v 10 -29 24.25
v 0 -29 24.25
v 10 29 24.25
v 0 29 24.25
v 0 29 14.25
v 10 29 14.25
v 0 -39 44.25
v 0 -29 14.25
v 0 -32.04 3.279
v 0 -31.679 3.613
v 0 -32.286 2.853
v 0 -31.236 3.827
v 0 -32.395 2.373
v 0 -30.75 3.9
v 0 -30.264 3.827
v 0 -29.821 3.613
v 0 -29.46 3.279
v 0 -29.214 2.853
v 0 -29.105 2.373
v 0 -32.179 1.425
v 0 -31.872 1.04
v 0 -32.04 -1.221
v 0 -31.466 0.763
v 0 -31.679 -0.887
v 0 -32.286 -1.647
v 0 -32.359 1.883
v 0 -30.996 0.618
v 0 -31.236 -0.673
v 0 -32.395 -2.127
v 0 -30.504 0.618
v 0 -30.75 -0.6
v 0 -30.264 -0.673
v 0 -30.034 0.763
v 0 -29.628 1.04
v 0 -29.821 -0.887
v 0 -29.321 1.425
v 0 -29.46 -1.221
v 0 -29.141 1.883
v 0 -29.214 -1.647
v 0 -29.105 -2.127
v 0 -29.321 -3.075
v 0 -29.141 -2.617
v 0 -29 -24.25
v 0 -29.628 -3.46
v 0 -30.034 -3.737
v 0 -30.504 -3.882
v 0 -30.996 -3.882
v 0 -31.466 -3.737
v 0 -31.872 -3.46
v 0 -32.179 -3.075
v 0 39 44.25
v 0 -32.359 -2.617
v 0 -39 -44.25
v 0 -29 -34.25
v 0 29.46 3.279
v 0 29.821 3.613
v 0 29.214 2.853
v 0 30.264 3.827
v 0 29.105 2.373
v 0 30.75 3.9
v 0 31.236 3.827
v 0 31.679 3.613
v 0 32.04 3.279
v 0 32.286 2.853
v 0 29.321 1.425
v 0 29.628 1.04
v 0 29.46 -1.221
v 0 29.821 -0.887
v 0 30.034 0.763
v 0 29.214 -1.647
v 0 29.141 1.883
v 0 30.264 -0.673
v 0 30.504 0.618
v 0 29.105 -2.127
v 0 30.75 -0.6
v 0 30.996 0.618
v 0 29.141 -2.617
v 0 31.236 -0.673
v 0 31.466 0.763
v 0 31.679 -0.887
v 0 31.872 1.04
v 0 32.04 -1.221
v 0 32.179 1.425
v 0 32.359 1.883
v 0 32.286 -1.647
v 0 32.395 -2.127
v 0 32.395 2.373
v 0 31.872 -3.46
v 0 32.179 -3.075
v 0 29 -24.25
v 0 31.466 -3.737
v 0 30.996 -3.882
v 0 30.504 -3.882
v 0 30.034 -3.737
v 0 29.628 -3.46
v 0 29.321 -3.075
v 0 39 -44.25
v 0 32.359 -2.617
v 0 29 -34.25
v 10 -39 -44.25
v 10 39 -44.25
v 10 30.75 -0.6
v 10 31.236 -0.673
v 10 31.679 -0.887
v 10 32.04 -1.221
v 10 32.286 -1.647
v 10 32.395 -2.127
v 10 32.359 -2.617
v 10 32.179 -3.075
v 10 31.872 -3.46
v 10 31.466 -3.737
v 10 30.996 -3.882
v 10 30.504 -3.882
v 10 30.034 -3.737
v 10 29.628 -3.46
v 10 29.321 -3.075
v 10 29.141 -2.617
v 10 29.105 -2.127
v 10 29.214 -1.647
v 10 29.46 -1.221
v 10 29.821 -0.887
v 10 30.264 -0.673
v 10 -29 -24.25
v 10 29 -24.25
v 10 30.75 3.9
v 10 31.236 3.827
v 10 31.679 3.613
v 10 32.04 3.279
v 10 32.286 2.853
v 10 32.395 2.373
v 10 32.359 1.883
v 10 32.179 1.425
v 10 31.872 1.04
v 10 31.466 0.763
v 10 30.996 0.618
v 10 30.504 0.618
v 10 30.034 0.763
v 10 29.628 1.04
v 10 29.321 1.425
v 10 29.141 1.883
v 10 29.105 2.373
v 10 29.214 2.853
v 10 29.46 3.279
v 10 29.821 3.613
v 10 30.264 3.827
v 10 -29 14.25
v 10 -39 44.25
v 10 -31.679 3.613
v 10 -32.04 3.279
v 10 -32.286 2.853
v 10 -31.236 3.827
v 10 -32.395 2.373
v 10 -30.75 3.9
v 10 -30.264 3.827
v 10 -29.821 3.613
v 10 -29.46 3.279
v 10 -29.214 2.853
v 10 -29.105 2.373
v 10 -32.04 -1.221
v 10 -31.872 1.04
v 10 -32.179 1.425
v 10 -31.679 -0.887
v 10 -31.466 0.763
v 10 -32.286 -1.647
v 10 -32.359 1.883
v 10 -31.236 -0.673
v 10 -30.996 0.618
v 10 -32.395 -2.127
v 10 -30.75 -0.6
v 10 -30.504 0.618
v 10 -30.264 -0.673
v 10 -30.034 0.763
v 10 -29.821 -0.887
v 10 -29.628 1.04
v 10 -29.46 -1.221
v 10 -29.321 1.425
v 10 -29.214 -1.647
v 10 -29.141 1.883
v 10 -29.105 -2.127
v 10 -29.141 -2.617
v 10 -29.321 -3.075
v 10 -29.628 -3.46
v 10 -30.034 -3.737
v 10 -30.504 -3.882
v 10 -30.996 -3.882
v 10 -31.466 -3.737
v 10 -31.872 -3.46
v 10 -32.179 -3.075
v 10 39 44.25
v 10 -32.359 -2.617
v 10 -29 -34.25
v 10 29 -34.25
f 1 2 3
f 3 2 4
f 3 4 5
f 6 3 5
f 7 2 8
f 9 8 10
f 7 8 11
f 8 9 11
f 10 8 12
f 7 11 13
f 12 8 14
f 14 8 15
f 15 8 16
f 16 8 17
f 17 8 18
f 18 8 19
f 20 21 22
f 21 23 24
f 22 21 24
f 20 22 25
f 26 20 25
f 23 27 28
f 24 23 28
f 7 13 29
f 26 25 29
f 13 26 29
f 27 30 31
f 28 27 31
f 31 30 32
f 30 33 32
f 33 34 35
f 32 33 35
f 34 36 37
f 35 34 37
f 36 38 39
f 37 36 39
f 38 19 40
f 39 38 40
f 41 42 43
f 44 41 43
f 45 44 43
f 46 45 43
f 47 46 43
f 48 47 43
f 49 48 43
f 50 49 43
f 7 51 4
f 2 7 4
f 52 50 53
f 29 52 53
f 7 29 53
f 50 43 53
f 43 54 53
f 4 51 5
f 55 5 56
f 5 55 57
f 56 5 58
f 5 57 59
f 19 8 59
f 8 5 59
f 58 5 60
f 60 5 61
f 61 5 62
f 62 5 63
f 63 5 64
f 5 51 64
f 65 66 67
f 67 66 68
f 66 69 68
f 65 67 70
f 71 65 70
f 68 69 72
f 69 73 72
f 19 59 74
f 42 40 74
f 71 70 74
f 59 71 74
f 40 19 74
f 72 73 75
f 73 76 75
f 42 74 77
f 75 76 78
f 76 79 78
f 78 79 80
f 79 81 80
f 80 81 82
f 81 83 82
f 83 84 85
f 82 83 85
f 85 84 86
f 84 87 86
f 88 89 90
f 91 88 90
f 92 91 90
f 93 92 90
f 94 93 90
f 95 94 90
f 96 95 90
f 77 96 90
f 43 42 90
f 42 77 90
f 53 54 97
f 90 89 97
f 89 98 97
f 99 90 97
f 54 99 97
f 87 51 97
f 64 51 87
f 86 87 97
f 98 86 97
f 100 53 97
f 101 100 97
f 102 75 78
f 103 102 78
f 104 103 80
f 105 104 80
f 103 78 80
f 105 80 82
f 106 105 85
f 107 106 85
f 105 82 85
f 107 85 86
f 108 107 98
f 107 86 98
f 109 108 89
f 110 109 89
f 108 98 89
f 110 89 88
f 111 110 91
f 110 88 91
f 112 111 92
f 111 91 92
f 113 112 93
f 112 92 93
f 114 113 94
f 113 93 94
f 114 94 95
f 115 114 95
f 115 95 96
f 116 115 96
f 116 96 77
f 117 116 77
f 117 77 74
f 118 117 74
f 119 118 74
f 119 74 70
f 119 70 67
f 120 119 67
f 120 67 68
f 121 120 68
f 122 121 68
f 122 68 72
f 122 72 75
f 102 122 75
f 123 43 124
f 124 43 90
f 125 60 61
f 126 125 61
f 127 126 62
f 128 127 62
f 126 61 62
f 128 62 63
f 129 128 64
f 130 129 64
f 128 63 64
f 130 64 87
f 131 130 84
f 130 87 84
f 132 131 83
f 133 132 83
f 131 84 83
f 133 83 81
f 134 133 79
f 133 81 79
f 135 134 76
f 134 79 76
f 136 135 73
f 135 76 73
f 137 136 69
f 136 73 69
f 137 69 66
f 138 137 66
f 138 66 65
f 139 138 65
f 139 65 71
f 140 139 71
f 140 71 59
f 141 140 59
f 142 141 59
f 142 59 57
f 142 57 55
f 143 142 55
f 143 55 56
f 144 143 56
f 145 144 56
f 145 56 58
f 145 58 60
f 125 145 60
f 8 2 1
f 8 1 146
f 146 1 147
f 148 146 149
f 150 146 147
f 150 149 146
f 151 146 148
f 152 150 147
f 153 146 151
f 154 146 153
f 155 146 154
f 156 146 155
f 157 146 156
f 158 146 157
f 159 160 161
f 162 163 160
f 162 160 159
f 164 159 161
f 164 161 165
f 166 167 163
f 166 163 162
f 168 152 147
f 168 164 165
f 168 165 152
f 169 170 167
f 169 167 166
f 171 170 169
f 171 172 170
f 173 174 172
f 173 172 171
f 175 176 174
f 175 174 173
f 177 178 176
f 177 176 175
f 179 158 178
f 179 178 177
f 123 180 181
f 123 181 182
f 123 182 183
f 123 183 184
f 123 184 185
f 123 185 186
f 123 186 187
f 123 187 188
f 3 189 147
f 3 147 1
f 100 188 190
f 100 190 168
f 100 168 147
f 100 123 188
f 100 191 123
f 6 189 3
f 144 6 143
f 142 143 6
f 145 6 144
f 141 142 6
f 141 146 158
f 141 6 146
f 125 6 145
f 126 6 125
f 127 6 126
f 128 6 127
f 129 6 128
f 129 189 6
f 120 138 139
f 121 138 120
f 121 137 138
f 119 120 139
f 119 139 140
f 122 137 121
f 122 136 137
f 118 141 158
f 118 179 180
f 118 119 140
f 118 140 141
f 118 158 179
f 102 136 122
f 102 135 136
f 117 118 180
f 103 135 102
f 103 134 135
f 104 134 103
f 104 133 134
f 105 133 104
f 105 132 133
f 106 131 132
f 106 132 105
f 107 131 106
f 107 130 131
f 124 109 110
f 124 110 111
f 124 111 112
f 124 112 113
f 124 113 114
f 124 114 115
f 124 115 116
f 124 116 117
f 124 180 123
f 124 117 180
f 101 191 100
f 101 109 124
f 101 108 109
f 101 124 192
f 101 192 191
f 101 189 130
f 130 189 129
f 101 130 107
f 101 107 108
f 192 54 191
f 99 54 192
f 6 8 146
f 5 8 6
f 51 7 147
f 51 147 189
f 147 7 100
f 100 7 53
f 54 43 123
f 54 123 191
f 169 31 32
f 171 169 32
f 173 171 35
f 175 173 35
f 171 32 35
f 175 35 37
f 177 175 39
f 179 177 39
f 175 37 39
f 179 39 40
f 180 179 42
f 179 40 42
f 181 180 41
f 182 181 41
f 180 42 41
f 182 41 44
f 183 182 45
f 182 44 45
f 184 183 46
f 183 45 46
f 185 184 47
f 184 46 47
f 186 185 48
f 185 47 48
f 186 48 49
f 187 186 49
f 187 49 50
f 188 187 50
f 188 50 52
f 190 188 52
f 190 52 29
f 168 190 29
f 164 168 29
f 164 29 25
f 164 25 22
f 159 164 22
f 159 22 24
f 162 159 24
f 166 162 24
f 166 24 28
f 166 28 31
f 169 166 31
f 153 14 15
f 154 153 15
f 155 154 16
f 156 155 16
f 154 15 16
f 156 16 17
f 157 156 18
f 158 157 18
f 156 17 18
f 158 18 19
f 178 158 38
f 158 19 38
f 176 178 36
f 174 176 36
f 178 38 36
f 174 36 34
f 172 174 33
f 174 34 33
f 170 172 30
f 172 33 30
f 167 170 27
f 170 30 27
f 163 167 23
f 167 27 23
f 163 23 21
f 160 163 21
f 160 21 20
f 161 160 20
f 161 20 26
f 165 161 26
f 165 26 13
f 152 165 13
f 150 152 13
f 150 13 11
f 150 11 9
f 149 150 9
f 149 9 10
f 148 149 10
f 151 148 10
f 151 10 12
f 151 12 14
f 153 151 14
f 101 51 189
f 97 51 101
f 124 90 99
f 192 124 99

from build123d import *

# Parameters (mm, degrees)
SKETCH1_W           = 88.5
SKETCH1_H           = 78
SKETCH1_W_2         = 10
SKETCH1_H_2         = 58
BOSS_EXTRUDE1_DEPTH = 10
M4_TAPPED_HOLE1_D   = 3.3


with BuildPart() as part:
    # Sketch1 → Boss-Extrude1 (new body)
    with BuildSketch(Plane(origin=(0, 0, 0), x_dir=(0, 0, -1), z_dir=(1, 0, 0))):
        Rectangle(SKETCH1_W, SKETCH1_H)
        with Locations((-19.25, 0)):
            Rectangle(SKETCH1_W_2, SKETCH1_H_2, mode=Mode.SUBTRACT)
        with Locations((29.25, 0)):
            Rectangle(SKETCH1_W_2, SKETCH1_H_2, mode=Mode.SUBTRACT)
    extrude(amount=BOSS_EXTRUDE1_DEPTH)

    # M4 Tapped Hole1 (through all)
    with Locations(Plane(origin=(10, 0, 0), x_dir=(0, 0, -1), z_dir=(1, 0, 0))):
        with Locations((-2.25, -30.75), (-2.25, 30.75), (2.25, -30.75), (2.25, 30.75)):
            Hole(M4_TAPPED_HOLE1_D / 2)


solid = part.part
